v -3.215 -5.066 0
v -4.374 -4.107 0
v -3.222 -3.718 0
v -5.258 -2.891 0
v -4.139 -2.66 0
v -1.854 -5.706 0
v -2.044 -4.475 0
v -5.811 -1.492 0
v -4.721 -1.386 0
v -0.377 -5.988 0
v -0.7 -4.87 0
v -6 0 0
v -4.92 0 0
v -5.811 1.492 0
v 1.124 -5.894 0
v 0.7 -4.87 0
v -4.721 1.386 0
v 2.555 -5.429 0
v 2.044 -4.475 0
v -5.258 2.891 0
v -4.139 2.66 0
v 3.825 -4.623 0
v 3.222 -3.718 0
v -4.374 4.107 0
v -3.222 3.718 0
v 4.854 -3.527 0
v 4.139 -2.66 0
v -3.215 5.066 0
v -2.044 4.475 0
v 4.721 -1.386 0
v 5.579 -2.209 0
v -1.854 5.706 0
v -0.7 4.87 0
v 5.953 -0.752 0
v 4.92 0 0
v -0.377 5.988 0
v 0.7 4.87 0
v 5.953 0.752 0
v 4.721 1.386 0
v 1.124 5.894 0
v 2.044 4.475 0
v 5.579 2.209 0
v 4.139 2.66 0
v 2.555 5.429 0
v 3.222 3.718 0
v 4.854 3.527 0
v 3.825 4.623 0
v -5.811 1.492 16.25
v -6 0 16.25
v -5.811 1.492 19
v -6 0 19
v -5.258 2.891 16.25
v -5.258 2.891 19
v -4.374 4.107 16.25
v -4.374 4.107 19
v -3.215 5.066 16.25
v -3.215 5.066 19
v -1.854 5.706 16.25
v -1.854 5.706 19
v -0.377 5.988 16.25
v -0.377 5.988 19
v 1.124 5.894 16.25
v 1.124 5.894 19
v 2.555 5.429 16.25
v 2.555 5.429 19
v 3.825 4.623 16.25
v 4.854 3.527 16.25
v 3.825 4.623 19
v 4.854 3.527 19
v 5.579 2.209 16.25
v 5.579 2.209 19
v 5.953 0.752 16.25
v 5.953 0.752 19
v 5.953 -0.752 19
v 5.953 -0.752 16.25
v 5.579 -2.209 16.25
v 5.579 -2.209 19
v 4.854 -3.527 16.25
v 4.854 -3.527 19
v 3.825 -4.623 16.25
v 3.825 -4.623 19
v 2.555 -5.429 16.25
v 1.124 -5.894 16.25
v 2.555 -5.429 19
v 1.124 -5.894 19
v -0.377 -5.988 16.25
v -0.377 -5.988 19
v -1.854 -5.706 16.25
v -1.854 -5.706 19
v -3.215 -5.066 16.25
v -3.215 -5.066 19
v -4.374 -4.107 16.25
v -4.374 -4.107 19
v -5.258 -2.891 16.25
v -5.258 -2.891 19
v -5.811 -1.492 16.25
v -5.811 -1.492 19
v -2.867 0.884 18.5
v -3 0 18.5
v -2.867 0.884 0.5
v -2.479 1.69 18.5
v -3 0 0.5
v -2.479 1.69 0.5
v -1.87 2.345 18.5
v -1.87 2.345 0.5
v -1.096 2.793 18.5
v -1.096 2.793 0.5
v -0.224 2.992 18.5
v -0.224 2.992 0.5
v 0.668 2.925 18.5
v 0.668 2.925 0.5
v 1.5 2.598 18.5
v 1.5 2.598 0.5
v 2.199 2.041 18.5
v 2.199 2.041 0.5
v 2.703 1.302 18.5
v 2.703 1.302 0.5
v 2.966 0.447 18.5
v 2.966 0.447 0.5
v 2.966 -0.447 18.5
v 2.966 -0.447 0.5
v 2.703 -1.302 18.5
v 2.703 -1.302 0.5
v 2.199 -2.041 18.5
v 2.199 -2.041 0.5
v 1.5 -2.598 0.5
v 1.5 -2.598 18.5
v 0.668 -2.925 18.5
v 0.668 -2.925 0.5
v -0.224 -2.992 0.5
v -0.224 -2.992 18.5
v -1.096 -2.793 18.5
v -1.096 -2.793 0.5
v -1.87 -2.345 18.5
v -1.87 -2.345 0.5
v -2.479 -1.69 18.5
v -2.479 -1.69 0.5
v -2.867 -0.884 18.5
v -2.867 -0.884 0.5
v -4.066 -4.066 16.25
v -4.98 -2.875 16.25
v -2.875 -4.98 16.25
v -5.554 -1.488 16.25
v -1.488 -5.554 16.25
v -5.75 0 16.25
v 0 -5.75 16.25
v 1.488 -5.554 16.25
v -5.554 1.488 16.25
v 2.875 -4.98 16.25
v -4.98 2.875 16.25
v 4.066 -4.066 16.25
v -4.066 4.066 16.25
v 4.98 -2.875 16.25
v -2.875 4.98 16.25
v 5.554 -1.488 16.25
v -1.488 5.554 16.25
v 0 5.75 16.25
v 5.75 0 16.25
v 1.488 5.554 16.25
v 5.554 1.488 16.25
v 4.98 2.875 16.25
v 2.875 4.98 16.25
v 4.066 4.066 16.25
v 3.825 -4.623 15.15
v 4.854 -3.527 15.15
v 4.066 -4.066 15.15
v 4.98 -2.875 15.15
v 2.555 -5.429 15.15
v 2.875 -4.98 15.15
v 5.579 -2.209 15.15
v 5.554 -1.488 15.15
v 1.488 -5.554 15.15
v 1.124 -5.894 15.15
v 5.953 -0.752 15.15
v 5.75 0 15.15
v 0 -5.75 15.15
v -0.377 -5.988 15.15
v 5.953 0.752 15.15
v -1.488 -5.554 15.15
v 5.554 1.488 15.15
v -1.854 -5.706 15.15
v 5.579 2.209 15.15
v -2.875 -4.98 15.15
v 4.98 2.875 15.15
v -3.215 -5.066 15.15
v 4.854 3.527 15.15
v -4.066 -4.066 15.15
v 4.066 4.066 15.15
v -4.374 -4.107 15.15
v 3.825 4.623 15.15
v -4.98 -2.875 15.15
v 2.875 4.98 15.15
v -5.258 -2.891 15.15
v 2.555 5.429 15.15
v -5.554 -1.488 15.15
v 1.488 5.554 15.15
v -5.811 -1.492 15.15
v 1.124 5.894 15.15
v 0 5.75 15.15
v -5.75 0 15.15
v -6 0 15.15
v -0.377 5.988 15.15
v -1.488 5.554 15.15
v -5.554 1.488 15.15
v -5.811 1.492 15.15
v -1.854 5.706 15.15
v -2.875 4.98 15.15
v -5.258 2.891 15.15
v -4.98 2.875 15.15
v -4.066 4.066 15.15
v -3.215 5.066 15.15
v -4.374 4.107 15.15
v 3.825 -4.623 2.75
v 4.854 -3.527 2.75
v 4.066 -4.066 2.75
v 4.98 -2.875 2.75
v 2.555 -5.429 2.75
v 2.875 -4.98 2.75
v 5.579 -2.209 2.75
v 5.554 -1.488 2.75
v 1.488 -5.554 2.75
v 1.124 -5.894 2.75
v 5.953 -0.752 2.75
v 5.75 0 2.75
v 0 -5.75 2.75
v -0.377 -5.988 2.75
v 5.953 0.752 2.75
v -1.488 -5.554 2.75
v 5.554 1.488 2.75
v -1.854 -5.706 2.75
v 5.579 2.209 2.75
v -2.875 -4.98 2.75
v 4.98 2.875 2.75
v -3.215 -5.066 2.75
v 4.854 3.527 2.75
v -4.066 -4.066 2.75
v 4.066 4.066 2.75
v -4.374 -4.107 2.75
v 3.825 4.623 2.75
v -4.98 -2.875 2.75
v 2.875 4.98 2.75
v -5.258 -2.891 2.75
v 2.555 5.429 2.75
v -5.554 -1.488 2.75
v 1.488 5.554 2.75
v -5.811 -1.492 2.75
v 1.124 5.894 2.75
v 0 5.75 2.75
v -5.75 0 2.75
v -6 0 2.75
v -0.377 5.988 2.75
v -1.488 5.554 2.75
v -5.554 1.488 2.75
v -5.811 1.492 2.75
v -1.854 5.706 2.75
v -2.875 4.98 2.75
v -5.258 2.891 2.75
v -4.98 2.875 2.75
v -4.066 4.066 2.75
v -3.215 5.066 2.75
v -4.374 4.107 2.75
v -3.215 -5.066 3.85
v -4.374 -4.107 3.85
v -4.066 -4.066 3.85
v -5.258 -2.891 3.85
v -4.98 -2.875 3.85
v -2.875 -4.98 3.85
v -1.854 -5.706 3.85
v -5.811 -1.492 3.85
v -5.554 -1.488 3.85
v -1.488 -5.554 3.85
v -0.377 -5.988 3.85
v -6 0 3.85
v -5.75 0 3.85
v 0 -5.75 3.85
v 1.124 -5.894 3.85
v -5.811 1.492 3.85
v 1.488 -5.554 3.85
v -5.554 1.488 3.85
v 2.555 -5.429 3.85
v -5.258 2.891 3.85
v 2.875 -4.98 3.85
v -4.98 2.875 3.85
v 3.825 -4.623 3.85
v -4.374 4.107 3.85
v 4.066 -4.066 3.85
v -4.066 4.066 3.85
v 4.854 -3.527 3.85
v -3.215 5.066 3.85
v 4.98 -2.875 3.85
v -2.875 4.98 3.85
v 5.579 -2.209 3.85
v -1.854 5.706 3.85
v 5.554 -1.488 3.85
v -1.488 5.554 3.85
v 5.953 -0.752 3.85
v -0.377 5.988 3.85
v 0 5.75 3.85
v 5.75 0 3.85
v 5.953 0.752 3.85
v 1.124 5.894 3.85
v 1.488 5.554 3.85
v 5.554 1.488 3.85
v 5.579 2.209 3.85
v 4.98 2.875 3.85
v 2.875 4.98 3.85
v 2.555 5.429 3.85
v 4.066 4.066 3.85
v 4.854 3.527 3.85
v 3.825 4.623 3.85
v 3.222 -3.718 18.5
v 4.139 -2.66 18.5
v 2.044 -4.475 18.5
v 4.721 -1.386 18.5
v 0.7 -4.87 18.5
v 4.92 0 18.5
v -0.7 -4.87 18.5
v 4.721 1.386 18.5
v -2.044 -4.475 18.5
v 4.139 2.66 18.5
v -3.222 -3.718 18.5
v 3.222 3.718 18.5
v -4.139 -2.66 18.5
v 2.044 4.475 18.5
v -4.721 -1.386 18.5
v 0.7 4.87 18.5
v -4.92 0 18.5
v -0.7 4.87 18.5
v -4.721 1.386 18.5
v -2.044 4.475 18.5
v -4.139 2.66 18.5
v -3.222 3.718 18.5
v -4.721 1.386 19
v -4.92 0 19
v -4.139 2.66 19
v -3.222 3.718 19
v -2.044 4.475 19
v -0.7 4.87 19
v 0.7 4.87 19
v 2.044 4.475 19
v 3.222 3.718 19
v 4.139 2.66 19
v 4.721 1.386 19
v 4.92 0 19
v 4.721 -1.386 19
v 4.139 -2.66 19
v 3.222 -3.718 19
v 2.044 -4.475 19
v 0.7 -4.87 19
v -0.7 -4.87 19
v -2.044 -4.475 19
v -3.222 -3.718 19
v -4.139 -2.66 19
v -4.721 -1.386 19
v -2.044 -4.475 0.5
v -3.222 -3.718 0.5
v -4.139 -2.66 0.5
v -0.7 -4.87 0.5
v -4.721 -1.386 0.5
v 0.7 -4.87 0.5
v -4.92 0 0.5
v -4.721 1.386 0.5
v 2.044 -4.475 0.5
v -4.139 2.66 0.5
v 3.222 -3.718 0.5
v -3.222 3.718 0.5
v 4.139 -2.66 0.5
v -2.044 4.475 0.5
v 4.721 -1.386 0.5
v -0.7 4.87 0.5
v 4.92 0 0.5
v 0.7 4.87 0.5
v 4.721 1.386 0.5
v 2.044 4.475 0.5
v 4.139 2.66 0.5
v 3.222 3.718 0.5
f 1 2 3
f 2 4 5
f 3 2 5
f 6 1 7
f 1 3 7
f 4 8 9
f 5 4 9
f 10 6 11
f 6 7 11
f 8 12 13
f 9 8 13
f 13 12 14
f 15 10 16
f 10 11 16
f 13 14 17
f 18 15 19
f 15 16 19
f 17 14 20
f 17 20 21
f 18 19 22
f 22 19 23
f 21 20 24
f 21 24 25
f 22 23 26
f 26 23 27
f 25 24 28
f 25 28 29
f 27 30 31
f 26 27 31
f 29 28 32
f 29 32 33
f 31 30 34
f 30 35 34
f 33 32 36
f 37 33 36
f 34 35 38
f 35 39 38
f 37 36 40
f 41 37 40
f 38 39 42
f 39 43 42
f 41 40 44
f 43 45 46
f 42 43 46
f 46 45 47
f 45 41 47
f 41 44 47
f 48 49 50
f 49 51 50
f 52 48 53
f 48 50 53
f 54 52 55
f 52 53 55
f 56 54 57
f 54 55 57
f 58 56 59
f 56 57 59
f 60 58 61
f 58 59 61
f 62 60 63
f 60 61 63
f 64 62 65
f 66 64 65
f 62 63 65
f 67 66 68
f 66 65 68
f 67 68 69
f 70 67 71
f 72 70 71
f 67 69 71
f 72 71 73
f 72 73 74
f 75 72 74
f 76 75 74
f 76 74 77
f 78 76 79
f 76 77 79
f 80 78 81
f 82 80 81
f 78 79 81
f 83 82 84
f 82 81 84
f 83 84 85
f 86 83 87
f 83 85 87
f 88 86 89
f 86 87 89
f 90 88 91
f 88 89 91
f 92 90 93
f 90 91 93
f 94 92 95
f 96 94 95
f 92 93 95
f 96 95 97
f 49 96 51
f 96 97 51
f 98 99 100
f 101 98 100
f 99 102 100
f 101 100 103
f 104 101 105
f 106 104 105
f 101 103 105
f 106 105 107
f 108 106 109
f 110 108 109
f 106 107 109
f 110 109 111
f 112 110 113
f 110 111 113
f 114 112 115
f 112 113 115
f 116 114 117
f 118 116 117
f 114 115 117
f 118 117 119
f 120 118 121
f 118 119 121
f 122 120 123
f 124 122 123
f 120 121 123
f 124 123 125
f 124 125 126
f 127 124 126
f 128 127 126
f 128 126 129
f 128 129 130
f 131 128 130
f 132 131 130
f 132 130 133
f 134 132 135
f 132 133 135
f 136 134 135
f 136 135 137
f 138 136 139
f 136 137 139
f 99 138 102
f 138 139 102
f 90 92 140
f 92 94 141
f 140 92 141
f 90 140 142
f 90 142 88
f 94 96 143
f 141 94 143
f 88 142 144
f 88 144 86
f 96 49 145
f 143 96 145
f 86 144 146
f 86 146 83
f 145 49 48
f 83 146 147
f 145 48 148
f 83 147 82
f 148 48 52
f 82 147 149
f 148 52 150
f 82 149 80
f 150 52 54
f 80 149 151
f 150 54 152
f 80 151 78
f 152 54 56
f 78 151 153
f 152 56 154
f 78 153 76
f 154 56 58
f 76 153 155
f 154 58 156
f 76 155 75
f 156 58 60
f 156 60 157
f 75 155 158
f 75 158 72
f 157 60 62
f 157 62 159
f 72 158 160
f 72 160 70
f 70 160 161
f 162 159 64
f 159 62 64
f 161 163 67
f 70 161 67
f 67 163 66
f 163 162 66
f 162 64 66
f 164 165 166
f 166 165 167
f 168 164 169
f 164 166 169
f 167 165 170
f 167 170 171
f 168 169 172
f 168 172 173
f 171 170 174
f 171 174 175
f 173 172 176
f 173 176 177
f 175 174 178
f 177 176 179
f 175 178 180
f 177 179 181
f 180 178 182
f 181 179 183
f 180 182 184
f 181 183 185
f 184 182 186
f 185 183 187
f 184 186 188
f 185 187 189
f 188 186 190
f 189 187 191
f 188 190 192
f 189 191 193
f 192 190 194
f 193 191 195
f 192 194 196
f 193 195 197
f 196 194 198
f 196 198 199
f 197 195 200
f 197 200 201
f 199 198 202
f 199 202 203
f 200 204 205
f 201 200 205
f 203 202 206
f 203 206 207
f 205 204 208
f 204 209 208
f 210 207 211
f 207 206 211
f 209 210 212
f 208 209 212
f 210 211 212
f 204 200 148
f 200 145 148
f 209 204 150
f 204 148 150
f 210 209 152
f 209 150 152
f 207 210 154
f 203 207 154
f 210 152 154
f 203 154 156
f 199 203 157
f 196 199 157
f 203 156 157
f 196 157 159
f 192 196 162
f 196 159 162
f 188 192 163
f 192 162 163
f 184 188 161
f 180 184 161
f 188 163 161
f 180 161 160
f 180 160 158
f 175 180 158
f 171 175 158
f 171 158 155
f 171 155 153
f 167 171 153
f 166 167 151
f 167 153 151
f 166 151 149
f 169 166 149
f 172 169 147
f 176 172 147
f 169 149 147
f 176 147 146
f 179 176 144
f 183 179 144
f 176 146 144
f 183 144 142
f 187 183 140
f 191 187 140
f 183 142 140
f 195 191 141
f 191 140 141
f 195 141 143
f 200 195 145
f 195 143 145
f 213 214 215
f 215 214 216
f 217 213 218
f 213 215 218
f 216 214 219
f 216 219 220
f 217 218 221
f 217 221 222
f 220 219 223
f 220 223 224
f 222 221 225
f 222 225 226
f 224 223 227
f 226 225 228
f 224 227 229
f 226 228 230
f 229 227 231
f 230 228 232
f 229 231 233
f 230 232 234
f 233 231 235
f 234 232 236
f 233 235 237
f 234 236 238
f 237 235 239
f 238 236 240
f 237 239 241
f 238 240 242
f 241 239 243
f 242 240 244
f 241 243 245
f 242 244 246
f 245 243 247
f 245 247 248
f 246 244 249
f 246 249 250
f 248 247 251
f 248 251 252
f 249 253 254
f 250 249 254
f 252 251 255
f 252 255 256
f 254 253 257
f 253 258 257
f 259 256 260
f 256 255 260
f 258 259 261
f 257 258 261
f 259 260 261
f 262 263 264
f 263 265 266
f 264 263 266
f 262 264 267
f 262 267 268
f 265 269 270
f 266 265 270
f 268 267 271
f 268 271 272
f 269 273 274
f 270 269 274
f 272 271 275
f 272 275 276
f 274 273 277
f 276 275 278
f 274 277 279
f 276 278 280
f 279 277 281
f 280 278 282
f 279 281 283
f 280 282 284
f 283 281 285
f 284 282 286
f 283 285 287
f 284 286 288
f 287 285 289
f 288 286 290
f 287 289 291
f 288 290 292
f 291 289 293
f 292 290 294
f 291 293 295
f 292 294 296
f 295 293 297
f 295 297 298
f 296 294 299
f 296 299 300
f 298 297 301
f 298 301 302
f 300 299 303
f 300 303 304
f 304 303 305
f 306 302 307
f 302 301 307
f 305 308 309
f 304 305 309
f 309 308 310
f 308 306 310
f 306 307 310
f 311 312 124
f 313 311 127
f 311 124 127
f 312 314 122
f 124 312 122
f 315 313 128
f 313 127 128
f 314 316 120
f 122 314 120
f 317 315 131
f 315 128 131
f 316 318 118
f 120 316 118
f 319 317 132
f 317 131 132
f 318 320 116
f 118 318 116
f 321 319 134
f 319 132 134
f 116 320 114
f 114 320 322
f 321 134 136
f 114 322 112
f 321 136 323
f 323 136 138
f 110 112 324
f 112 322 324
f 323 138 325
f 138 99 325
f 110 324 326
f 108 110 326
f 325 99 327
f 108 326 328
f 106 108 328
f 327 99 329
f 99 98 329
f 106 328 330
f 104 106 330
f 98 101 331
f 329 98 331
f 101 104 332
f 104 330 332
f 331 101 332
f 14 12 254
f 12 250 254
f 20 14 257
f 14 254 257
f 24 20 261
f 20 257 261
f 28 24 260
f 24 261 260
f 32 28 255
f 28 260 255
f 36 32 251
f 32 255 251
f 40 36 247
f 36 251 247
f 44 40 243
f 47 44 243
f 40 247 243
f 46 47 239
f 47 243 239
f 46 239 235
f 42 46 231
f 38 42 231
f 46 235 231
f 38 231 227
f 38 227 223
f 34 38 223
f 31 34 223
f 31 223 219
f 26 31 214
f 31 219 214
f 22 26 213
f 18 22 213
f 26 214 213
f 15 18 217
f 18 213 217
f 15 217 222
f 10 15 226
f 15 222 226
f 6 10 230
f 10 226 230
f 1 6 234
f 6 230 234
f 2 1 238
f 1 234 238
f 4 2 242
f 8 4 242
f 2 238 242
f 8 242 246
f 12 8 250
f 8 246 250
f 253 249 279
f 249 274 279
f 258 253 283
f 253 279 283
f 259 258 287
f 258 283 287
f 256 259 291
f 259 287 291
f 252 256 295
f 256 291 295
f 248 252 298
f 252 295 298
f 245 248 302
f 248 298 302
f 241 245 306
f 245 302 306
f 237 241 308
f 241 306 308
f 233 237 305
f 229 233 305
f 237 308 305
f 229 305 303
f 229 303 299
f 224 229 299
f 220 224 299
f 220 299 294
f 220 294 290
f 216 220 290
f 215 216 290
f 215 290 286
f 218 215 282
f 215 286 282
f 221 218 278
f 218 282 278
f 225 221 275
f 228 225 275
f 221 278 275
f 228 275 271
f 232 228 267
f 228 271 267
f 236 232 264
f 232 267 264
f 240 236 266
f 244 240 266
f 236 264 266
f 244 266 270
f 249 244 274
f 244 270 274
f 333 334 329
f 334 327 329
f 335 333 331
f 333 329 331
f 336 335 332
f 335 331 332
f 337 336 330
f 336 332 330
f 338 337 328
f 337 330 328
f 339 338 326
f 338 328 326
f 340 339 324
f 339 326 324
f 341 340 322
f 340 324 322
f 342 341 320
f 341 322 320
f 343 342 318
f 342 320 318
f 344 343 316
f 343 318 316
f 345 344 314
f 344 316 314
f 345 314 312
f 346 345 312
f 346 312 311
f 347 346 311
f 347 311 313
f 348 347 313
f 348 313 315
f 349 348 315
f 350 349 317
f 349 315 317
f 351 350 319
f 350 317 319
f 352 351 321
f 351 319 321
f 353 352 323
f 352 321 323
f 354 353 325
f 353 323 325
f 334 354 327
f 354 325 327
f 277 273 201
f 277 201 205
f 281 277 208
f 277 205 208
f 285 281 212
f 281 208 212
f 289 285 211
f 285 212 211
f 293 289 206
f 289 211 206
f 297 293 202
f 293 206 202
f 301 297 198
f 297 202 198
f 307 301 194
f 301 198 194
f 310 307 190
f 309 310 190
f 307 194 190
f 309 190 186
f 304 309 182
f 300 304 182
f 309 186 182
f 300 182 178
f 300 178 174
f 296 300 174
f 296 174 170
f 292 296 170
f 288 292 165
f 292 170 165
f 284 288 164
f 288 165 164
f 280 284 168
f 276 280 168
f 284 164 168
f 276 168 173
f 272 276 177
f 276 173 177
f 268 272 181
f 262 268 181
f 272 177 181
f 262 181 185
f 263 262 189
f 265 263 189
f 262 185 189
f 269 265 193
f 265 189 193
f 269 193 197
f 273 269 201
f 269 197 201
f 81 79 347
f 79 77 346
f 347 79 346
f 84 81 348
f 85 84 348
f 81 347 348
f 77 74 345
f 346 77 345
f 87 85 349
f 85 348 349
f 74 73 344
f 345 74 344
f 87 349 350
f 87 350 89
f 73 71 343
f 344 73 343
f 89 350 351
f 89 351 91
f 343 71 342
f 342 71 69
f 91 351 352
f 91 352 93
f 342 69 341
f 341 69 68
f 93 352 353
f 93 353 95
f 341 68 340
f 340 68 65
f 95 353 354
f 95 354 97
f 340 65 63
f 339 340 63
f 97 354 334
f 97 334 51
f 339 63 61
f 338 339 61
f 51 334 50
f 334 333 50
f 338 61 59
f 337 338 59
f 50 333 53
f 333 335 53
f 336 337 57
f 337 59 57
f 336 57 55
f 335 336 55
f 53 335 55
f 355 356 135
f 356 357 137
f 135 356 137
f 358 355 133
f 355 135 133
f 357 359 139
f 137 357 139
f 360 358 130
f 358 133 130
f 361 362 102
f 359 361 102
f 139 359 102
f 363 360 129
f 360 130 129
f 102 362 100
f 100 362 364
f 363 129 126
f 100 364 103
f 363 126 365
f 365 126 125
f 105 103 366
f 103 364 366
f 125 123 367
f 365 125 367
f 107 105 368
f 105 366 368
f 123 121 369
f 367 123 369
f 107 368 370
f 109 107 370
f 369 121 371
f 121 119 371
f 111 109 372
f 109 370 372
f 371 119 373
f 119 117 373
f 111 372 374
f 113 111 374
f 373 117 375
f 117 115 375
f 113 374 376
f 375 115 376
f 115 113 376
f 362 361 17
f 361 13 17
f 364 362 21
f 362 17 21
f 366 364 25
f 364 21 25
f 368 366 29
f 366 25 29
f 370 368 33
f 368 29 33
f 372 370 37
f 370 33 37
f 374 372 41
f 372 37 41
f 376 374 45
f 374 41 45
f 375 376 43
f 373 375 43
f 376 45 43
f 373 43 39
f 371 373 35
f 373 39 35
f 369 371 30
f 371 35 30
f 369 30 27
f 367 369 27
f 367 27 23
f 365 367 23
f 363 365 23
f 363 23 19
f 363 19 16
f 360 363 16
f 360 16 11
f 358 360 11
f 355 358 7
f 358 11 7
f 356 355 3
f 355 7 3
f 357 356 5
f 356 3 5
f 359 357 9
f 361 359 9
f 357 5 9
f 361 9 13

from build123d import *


with BuildPart() as part:
    # Sketch1 → Revolve1 (revolve)
    with BuildSketch(Plane.XZ, mode=Mode.PRIVATE) as revolve1_sk:
        Polygon((6, 16.25), (6, 19), (4.92, 19), (4.92, 18.5), (3, 18.5), (3, 0.5), (4.92, 0.5), (4.92, 0), (6, 0), (6, 2.75), (5.75, 2.75), (5.75, 3.85), (6, 3.85), (6, 15.15), (5.75, 15.15), (5.75, 16.25), align=None)
    revolve(revolve1_sk.sketch.rotate(Axis((0, 0, 19), (0, 0, -1)), 180), axis=Axis((0, 0, 19), (0, 0, -1)))


solid = part.part
